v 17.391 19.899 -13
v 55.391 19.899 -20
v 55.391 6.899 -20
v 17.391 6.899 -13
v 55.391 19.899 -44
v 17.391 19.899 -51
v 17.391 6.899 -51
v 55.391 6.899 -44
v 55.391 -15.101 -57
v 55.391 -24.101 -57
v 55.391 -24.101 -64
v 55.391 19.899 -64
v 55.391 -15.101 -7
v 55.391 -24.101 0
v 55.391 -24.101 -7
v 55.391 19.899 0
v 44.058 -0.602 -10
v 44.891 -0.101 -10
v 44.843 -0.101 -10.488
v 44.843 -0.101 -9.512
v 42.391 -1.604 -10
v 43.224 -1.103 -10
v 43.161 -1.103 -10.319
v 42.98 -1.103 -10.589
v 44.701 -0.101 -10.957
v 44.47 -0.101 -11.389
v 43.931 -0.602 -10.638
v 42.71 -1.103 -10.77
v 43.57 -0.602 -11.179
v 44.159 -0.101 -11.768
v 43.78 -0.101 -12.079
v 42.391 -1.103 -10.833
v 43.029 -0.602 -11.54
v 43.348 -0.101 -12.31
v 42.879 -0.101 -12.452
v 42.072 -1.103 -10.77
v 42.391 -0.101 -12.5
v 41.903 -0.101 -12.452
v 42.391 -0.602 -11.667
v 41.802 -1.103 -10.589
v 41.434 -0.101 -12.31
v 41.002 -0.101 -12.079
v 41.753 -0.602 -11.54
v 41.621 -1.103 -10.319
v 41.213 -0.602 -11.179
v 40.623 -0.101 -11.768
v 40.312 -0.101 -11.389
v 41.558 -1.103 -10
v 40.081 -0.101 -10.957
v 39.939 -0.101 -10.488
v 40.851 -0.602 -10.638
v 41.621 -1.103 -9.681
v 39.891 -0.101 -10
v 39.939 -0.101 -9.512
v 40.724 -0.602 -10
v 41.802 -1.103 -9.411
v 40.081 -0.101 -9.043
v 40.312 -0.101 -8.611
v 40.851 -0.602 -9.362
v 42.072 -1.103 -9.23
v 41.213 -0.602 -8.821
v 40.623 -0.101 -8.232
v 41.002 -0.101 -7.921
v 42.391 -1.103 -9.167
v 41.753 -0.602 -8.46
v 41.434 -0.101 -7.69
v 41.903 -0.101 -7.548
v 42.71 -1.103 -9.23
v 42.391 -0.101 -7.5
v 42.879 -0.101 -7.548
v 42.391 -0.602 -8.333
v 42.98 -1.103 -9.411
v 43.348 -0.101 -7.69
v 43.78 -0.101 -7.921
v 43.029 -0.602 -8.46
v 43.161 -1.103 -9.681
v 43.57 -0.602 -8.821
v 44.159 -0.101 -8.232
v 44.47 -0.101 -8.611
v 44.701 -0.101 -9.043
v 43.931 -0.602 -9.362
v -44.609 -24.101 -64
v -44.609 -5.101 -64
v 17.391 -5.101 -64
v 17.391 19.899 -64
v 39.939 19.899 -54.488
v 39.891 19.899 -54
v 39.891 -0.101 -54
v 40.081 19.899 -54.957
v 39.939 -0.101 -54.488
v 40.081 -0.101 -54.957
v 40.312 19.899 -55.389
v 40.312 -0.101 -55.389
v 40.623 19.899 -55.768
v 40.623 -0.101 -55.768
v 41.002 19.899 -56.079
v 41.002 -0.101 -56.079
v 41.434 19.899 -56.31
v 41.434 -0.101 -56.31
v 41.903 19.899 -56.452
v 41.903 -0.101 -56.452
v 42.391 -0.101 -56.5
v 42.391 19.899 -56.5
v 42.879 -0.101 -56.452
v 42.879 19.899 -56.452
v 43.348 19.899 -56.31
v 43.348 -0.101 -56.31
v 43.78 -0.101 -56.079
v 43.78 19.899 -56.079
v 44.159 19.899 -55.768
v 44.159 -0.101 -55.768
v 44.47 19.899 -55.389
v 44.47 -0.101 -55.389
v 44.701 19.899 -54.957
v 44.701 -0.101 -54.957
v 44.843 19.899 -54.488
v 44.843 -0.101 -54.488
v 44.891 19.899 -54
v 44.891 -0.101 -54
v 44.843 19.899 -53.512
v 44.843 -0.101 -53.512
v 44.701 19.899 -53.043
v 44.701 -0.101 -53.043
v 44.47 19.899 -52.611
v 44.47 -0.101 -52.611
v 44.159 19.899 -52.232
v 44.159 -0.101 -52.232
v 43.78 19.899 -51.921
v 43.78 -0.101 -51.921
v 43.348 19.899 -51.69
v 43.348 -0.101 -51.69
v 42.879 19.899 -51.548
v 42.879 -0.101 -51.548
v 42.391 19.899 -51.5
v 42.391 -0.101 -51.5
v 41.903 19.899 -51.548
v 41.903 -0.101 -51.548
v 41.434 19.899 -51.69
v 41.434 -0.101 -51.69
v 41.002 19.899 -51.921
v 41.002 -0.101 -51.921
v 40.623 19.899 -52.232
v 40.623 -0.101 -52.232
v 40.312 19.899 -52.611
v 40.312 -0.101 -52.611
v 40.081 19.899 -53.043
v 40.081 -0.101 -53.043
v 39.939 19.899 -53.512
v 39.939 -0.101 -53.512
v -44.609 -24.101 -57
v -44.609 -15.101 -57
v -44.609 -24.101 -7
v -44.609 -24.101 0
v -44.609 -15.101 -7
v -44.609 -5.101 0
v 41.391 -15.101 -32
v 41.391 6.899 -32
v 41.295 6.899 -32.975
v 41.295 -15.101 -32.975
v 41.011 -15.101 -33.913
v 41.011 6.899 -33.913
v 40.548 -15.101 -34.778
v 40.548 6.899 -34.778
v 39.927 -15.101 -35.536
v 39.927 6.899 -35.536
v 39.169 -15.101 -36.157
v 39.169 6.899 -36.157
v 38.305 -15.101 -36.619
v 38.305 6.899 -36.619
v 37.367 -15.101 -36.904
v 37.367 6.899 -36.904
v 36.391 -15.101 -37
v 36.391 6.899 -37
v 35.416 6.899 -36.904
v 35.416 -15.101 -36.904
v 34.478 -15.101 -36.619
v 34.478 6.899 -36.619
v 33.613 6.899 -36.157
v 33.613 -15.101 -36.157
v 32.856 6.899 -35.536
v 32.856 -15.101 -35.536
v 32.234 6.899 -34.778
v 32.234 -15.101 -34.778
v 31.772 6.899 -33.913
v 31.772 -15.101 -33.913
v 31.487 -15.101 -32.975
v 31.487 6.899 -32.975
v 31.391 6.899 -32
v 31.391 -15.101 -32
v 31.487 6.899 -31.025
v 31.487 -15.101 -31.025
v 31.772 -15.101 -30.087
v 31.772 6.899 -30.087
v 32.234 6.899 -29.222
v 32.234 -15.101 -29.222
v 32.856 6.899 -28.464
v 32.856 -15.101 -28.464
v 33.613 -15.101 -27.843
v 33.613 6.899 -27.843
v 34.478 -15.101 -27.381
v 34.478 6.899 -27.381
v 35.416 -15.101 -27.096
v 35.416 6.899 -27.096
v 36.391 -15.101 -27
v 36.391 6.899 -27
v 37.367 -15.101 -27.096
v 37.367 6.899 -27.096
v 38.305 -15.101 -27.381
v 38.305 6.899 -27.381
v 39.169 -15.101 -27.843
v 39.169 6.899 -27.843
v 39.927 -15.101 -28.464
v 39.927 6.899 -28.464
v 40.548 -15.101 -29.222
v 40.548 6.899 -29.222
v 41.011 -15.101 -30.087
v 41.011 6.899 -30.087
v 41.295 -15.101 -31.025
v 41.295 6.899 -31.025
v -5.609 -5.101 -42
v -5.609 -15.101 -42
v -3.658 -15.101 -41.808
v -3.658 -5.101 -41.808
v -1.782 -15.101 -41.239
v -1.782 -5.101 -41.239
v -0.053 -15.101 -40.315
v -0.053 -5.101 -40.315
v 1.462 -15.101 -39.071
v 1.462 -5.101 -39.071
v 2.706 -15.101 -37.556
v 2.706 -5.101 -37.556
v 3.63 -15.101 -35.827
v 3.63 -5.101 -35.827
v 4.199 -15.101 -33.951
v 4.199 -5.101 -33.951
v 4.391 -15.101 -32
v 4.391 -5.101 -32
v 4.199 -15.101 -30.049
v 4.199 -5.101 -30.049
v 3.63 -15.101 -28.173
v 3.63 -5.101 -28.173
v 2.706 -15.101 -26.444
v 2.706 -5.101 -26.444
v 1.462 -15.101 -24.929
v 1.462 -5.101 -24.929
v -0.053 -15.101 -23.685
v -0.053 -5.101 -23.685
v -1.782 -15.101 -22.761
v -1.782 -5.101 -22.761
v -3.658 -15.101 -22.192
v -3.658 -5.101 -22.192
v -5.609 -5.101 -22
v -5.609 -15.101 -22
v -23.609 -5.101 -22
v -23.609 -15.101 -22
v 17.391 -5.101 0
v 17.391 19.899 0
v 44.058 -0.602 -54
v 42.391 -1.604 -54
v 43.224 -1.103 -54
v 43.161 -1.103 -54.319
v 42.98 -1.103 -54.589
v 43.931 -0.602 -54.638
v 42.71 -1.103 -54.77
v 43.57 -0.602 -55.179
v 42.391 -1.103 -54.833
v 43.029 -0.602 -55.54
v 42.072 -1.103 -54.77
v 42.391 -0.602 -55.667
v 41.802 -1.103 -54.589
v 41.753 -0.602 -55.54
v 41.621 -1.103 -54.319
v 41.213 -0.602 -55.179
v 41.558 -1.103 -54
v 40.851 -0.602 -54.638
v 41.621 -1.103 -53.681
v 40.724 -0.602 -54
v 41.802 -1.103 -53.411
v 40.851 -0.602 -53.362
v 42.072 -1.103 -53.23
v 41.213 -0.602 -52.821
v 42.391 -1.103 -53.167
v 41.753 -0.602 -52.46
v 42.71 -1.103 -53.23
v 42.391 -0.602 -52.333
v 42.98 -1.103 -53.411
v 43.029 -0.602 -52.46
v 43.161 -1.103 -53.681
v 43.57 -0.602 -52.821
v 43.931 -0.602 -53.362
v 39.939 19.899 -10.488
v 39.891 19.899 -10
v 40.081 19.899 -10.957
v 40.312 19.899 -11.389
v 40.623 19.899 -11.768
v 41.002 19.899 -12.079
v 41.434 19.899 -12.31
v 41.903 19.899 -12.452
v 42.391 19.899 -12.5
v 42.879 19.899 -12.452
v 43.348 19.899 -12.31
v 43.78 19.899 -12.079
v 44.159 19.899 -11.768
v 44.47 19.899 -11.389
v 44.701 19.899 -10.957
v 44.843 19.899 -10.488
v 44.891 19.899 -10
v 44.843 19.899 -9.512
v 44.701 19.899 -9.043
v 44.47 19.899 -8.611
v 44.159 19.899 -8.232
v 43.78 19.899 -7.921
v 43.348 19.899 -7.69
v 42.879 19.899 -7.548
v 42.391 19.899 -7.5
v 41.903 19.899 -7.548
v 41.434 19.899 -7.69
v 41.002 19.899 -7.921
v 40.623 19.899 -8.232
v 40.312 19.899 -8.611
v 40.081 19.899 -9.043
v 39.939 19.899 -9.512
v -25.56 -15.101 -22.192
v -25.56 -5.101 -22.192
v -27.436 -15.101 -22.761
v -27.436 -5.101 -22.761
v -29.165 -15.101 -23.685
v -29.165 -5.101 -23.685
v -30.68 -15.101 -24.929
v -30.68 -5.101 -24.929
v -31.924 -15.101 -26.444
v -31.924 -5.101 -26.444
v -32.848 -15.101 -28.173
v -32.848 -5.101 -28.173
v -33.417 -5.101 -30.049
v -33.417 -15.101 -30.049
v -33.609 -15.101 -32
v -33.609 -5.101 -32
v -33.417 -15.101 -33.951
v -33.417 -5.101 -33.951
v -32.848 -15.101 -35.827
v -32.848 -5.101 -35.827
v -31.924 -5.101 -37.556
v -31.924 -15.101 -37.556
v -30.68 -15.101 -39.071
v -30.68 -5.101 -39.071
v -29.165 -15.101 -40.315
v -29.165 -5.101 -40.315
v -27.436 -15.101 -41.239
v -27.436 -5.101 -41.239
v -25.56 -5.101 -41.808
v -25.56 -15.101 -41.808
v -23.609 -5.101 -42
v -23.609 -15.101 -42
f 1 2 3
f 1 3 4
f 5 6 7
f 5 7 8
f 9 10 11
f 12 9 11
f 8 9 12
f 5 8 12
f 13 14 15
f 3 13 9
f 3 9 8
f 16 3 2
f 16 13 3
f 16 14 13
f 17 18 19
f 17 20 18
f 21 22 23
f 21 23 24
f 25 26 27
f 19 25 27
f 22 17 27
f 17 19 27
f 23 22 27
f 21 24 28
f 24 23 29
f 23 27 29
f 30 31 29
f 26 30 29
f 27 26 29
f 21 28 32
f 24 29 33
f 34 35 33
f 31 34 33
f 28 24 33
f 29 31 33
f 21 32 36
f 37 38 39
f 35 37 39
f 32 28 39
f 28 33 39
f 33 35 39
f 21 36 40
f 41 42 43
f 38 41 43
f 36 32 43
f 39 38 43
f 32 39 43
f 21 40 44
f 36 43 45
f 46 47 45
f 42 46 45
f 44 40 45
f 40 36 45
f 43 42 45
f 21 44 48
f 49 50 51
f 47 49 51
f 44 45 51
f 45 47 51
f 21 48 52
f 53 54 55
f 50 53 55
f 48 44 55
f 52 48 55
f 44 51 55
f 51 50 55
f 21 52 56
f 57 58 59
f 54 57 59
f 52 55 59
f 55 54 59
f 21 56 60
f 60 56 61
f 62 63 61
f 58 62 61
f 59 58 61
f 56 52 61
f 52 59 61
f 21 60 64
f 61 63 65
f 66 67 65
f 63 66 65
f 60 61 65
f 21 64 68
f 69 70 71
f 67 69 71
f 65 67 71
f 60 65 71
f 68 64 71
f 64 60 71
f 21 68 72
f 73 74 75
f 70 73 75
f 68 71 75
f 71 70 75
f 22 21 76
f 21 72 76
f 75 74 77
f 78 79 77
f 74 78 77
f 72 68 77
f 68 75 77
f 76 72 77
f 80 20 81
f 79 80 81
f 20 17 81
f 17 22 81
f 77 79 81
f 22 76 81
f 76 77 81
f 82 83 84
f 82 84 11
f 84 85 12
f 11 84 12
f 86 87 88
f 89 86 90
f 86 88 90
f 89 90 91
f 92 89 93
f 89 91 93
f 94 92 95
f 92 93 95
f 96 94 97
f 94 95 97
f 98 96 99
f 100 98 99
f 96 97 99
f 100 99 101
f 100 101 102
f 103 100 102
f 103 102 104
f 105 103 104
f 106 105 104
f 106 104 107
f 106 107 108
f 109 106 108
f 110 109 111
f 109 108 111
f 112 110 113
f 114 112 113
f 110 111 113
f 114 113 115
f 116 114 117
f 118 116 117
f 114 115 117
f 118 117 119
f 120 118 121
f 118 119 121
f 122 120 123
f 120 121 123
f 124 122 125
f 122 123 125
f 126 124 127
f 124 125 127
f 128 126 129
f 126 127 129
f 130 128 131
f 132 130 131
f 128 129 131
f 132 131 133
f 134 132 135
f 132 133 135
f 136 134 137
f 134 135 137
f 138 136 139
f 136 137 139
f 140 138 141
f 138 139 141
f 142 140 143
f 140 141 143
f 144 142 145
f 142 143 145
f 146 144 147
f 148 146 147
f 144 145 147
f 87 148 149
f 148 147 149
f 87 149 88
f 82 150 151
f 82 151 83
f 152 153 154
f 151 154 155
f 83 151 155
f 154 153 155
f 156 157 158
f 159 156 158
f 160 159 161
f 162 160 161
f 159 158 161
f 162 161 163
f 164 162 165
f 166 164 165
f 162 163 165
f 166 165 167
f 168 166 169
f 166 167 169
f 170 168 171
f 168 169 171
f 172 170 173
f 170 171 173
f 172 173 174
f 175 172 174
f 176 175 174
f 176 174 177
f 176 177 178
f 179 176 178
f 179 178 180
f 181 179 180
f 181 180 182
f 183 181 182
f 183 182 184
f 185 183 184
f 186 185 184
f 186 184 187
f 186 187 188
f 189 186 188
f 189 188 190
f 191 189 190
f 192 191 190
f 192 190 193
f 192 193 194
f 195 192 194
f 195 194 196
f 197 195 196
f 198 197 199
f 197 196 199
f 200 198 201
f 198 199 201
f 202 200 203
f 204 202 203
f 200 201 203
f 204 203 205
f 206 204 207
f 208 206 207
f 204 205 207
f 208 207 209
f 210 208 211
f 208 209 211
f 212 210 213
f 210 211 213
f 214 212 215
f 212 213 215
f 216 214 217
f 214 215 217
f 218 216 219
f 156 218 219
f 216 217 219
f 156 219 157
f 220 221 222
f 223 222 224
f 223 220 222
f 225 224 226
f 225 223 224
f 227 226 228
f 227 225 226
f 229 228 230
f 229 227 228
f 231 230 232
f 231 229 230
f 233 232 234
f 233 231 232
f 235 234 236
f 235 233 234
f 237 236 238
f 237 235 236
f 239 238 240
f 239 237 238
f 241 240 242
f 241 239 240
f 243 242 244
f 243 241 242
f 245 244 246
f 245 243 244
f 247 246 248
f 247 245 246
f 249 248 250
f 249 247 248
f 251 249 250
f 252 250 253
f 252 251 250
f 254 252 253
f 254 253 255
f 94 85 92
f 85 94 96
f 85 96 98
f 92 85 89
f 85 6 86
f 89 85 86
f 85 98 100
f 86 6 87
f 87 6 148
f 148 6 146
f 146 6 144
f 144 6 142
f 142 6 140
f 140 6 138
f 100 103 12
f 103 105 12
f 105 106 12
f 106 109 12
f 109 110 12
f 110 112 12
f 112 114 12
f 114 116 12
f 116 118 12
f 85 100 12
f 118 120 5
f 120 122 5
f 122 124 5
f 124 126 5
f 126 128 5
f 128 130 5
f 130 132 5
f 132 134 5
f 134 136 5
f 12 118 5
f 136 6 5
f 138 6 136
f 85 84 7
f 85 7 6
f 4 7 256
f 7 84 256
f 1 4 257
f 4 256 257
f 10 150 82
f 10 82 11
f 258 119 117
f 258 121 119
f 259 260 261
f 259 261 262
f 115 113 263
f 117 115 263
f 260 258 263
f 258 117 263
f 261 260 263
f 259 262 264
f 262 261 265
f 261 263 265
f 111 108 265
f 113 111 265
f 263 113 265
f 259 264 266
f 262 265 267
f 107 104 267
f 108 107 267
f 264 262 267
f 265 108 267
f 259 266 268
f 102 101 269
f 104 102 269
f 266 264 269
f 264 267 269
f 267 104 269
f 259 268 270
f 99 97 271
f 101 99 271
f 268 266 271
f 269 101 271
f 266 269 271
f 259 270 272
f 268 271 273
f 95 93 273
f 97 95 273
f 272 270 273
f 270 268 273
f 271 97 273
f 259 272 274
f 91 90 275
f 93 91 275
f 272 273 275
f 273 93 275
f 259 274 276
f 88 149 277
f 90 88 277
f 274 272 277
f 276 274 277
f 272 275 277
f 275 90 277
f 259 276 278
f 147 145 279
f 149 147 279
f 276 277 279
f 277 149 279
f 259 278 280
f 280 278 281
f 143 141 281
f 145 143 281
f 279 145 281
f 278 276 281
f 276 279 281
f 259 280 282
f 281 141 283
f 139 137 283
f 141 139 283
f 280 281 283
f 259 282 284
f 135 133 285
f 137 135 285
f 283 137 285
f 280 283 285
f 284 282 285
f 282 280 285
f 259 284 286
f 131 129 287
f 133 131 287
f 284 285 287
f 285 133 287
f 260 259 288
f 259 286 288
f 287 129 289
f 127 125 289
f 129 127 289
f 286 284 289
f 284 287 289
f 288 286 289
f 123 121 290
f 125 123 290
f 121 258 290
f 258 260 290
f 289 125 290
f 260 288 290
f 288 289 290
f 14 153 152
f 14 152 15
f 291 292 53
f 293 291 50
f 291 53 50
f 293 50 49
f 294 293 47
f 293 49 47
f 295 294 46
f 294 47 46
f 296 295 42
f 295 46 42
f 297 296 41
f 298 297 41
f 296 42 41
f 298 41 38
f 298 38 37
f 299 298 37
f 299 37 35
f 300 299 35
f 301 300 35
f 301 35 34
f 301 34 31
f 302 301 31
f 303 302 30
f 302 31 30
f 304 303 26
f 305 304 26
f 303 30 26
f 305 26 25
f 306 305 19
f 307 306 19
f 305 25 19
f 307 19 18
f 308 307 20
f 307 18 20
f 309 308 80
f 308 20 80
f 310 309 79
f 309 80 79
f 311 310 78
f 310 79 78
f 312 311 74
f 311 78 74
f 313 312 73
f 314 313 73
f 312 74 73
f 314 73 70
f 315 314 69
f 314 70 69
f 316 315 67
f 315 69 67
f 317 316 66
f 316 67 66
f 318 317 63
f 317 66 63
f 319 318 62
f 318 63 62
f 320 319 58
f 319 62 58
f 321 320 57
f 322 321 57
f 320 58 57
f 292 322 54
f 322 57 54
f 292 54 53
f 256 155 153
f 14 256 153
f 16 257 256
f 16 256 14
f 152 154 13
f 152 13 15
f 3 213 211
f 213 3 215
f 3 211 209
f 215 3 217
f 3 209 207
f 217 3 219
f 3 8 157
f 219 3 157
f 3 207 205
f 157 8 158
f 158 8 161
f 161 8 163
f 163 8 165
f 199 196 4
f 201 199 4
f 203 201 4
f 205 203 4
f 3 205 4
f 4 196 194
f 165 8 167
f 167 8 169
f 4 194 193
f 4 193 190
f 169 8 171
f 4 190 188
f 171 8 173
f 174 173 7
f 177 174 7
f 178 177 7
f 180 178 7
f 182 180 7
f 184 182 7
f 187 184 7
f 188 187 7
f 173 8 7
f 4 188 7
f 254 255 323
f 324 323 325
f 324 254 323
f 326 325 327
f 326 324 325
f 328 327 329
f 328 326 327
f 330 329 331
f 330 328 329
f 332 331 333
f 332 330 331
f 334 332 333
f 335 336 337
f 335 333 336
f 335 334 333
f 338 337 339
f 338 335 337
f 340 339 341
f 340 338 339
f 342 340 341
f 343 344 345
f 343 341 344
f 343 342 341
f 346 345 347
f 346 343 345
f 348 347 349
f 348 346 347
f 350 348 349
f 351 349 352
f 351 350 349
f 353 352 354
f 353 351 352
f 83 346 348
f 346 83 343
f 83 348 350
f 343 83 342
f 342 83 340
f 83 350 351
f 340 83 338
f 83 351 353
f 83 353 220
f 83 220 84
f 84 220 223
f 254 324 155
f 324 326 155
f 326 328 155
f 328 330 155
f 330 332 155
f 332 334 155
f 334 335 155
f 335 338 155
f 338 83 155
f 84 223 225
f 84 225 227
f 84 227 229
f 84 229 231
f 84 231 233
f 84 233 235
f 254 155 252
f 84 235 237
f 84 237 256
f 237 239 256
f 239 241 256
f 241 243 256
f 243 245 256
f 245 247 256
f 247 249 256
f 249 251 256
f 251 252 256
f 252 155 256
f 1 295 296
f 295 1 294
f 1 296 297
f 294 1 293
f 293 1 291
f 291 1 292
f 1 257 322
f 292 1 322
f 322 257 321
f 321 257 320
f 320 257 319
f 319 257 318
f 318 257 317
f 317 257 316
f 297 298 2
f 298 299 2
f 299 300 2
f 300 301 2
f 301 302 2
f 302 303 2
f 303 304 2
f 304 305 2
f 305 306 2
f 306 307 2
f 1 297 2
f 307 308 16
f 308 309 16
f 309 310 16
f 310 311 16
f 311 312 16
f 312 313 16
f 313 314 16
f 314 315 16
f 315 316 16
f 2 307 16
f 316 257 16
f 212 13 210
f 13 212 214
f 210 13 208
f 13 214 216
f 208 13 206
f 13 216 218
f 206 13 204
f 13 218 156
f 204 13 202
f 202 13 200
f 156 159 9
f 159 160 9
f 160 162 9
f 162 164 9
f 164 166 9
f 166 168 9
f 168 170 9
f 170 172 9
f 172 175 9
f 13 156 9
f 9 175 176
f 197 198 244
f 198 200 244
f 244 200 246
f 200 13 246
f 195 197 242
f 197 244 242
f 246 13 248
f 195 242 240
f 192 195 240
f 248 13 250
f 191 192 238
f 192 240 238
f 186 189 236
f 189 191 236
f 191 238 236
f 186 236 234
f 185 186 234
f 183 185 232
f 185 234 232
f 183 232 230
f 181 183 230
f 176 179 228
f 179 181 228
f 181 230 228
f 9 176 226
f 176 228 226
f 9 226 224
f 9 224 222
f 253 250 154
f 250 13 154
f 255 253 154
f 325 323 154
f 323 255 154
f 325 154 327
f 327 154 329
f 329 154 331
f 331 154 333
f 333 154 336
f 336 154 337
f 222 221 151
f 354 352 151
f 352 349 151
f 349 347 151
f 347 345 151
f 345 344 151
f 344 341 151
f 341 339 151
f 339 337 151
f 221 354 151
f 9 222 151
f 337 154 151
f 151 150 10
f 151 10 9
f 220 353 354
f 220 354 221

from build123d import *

# Parameters (mm, degrees)
SKETCH1_W                   = 100
SKETCH1_H                   = 19
SKETCH1_W_2                 = 38
SKETCH1_H_2                 = 25
BOSS_EXTRUDE1_DEPTH         = 64
CUT_EXTRUDE1_DEPTH          = 13
CUT_EXTRUDE2_DEPTH          = 20
CUT_EXTRUDE3_DEPTH          = 101
TAP_DRILL_FOR_M6_TAP1_D     = 5
TAP_DRILL_FOR_M6_TAP1_DEPTH = 20
TAP_DRILL_FOR_M6_TAP1_TIP   = 1.502151548
SKETCH9_R                   = 5
CUT_EXTRUDE4_DEPTH          = 32


with BuildPart() as part:
    # Sketch1 → Boss-Extrude1 (new body)
    with BuildSketch(Plane.XY):
        with Locations((5.391120507, -14.601479915)):
            Rectangle(SKETCH1_W, SKETCH1_H)
        with Locations((36.391120507, 7.398520085)):
            Rectangle(SKETCH1_W_2, SKETCH1_H_2)
    extrude(amount=-BOSS_EXTRUDE1_DEPTH)

    # Sketch2 → Cut-Extrude1 (cut)
    with BuildSketch(Plane(origin=(0, 19.898520085, 0), x_dir=(1, 0, 0), z_dir=(0, 1, 0))):
        Polygon((55.391120507, 44), (55.391120507, 20), (17.391120507, 13), (17.391120507, 51), align=None)
    extrude(amount=-CUT_EXTRUDE1_DEPTH, mode=Mode.SUBTRACT)

    # Sketch3 → Cut-Extrude2 (cut, through all)
    with BuildSketch(Plane(origin=(0, -5.101479915, 0), x_dir=(1, 0, 0), z_dir=(0, 1, 0))):
        with BuildLine():
            Line((-23.608879493, 42), (-5.608879493, 42))
            ThreePointArc((-5.608879493, 42), (4.391120507, 32), (-5.608879493, 22))
            Line((-5.608879493, 22), (-23.608879493, 22))
            ThreePointArc((-23.608879493, 22), (-33.608879493, 32), (-23.608879493, 42))
        make_face()
    extrude(amount=-CUT_EXTRUDE2_DEPTH, mode=Mode.SUBTRACT)

    # Sketch5 → Cut-Extrude3 (cut, through all)
    with BuildSketch(Plane.ZY.offset(44.608879493)):
        Polygon((-14.043777718, -15.101479915), (-7, -15.101479915), (-7, -24.101479915), (-57, -24.101479915), (-57, -15.101479915), (-52.287609929, -15.101479915), align=None)
    extrude(amount=-CUT_EXTRUDE3_DEPTH, mode=Mode.SUBTRACT)

    # Tap Drill for M6 Tap1
    with Locations(Plane(origin=(0, 19.898520085, 0), x_dir=(1, 0, 0), z_dir=(0, 1, 0))):
        with Locations((42.391120507, 54), (42.391120507, 10)):
            Hole(TAP_DRILL_FOR_M6_TAP1_D / 2, depth=TAP_DRILL_FOR_M6_TAP1_DEPTH)
            with Locations((0, 0, -(TAP_DRILL_FOR_M6_TAP1_DEPTH + TAP_DRILL_FOR_M6_TAP1_TIP / 2))):  # 118° drill point
                Cone(0, TAP_DRILL_FOR_M6_TAP1_D / 2, TAP_DRILL_FOR_M6_TAP1_TIP, mode=Mode.SUBTRACT)

    # Sketch9 → Cut-Extrude4 (cut, through all)
    with BuildSketch(Plane(origin=(0, 6.898520085, 0), x_dir=(1, 0, 0), z_dir=(0, 1, 0))):
        with Locations((36.391120507, 32)):
            Circle(SKETCH9_R)
    extrude(amount=-CUT_EXTRUDE4_DEPTH, mode=Mode.SUBTRACT)


solid = part.part
